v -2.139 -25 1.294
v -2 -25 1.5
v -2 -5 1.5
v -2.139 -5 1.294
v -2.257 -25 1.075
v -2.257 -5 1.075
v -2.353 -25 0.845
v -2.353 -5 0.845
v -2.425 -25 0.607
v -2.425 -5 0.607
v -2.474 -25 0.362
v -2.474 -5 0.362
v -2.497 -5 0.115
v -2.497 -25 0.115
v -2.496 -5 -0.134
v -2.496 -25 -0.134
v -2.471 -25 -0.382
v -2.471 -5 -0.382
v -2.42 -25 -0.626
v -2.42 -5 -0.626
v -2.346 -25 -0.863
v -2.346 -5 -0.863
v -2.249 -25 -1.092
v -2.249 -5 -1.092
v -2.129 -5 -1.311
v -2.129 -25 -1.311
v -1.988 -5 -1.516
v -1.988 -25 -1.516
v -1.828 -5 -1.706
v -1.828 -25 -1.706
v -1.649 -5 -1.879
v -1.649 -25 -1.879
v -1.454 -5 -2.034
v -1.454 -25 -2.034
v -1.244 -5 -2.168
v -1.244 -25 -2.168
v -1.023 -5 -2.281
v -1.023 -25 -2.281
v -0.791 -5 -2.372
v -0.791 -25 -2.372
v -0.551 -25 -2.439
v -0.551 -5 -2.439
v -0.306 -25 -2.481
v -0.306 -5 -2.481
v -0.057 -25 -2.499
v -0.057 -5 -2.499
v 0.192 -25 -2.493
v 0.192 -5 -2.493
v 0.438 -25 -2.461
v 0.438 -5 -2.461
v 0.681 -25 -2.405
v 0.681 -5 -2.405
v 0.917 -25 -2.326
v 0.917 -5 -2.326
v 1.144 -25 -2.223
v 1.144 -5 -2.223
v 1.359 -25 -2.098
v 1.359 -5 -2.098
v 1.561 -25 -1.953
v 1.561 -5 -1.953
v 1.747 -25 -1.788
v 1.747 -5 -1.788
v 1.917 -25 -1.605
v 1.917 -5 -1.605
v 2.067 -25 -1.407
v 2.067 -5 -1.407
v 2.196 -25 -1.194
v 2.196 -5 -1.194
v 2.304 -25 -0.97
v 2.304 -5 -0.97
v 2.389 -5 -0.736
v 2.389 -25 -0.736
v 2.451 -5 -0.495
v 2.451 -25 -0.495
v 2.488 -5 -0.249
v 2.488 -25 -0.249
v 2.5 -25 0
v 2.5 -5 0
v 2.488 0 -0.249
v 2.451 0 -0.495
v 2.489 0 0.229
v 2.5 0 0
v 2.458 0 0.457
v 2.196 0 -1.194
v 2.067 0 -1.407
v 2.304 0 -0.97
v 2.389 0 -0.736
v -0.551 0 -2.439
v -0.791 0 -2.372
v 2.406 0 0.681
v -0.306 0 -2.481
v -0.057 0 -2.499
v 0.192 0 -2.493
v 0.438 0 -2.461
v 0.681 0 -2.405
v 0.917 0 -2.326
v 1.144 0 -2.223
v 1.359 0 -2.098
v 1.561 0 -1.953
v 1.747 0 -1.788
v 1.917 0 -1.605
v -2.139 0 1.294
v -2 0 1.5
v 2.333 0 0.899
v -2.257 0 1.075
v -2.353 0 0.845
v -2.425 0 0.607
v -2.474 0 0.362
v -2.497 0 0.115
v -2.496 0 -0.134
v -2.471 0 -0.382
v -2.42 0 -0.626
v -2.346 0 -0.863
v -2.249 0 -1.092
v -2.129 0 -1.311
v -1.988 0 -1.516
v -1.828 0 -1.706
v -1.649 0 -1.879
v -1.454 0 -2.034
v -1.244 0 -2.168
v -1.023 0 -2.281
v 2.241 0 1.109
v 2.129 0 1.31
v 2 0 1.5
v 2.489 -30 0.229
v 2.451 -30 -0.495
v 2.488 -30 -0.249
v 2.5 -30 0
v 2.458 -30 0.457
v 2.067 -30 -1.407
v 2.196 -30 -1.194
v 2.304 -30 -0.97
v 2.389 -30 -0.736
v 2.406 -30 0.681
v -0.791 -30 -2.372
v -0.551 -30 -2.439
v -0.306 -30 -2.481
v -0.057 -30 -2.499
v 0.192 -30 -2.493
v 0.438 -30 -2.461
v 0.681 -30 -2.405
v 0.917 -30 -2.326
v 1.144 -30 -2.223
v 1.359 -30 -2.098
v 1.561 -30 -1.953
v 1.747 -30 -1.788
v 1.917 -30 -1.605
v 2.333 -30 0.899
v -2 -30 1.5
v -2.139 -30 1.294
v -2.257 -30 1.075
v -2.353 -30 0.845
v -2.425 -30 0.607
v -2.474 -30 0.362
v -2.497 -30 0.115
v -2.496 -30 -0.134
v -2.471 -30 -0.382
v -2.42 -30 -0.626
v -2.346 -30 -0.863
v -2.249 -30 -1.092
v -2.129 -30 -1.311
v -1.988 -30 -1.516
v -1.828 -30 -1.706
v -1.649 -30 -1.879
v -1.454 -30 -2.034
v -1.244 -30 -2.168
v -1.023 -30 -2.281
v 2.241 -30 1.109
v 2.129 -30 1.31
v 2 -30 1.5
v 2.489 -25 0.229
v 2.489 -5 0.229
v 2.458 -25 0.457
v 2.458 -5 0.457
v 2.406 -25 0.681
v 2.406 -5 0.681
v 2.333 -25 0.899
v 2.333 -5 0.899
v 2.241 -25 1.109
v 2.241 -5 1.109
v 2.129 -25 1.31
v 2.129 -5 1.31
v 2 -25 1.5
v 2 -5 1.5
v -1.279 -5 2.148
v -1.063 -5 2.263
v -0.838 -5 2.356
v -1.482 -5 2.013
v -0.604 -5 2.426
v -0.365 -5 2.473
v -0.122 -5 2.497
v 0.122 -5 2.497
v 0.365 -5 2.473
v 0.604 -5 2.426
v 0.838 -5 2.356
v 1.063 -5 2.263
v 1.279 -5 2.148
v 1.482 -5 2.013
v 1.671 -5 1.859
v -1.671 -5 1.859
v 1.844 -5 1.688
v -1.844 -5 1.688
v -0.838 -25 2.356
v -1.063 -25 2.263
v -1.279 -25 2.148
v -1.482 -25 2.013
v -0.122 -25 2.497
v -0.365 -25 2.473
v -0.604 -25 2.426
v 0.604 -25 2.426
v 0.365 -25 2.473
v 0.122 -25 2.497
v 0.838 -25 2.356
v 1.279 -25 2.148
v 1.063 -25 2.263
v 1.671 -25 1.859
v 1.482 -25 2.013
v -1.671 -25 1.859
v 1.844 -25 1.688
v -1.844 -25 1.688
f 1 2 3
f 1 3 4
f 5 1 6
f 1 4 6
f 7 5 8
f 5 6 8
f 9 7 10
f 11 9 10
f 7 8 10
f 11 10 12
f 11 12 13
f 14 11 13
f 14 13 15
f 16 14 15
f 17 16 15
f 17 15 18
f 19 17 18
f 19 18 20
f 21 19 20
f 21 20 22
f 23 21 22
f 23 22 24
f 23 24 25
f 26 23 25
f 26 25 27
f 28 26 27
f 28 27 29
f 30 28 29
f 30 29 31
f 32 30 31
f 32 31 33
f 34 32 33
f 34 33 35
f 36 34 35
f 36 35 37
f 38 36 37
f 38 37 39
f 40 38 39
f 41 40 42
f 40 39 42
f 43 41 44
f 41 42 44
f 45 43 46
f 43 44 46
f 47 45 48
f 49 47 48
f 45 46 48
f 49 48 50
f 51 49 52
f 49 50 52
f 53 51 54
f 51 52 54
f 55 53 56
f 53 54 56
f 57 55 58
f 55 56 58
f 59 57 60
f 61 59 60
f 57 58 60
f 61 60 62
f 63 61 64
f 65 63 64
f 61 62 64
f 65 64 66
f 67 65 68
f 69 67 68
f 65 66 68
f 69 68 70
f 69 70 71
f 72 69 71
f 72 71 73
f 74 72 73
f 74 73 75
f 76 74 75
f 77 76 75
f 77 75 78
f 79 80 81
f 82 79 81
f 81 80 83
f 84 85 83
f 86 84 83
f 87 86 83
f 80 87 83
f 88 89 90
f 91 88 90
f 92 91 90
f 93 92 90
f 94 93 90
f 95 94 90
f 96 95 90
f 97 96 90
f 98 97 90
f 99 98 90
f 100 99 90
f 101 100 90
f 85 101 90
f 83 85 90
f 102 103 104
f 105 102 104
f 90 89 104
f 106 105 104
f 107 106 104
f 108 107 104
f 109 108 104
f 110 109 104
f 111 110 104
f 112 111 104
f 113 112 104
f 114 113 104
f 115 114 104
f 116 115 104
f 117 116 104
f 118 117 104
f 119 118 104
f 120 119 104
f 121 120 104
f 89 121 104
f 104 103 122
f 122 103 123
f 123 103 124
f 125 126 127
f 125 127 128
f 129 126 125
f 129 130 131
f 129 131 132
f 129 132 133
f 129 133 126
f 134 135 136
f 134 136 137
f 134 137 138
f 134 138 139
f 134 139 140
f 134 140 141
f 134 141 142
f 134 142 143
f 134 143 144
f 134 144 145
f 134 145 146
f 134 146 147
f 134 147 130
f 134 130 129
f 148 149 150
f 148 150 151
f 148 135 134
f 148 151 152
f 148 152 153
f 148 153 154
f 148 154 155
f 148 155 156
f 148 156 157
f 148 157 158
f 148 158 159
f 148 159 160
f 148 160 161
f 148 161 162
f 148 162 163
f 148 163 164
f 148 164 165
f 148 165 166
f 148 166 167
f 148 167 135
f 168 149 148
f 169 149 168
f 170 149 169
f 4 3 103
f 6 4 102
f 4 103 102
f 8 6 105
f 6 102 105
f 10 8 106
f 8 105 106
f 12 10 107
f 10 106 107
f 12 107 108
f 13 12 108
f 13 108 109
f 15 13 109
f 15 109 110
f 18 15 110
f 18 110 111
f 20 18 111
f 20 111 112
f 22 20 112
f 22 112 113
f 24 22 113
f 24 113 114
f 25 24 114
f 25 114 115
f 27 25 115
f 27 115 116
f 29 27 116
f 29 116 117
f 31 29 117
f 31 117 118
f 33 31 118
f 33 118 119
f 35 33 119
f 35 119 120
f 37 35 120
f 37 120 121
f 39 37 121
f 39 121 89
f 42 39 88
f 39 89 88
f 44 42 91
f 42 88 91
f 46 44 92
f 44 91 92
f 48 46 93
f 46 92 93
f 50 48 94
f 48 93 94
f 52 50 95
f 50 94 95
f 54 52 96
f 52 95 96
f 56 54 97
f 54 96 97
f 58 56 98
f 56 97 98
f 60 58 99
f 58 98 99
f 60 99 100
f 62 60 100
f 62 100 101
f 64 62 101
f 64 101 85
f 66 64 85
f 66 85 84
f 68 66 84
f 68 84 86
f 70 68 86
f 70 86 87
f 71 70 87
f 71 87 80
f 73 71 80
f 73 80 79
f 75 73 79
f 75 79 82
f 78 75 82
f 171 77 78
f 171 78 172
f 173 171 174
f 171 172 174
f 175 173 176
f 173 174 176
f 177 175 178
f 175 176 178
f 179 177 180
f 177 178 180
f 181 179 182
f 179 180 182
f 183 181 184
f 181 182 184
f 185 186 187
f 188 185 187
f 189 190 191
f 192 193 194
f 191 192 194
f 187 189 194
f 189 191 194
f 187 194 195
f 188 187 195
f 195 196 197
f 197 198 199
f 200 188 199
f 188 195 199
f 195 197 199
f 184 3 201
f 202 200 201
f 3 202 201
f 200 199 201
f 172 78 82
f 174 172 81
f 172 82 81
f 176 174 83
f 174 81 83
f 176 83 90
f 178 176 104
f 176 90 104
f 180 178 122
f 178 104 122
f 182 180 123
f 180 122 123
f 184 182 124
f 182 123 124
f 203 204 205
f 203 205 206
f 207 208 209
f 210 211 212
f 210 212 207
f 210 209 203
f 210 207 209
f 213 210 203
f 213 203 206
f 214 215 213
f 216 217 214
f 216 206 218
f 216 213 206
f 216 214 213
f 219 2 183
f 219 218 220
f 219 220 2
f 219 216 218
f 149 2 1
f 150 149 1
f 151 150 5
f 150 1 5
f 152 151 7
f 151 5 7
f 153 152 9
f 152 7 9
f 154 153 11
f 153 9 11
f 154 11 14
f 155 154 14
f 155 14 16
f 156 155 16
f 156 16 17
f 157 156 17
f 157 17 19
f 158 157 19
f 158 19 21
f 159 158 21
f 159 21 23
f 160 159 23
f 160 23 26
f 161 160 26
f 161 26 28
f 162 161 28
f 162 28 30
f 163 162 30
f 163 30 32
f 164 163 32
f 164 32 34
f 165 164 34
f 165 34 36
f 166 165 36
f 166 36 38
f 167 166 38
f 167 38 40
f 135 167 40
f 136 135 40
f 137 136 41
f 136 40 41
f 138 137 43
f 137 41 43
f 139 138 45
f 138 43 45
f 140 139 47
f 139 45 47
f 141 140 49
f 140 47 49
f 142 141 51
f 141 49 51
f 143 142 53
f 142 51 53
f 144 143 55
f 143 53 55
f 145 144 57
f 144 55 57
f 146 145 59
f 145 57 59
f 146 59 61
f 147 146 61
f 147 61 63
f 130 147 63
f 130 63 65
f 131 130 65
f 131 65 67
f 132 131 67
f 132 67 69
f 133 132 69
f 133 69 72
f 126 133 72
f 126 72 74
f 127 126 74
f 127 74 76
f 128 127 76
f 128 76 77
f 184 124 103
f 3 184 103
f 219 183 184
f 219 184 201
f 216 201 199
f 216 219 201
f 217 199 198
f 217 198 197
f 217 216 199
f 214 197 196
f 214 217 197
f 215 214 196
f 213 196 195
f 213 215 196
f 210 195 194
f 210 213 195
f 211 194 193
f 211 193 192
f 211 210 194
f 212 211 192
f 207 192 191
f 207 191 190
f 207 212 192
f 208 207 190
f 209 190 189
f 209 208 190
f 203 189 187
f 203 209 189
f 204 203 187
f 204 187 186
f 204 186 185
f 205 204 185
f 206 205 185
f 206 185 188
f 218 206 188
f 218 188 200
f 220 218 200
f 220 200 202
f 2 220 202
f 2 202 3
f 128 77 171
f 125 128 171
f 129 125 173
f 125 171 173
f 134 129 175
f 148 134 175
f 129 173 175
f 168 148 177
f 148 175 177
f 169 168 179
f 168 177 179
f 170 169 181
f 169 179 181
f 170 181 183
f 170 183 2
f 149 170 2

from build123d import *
from build123d import SkipClean  # not in build123d's __all__

# Parameters (mm, degrees)
F1_DEPTH = 30
F3_START = -5
F2_R     = 2.5
F3_DEPTH = 20


with BuildPart() as f1:
    # F0 (on Front) → F1 (new body)
    with BuildSketch(Plane.XZ):
        with BuildLine():
            ThreePointArc((-2, 1.5), (-0.790569415, -2.3717082451), (2.5, 0))
            ThreePointArc((2.5, 0), (2.3717082451, 0.790569415), (2, 1.5))
            Line((2, 1.5), (-2, 1.5))
        make_face()
    extrude(amount=F1_DEPTH)

    # F2 (on face) → F3 (join)
    with BuildSketch(Plane.XZ.offset(30).offset(F3_START)):
        Circle(F2_R)
    with SkipClean():  # cleaning this boolean's faces spoils the solid; the shape is the same uncleaned
        extrude(amount=-F3_DEPTH)


solid = f1.part
